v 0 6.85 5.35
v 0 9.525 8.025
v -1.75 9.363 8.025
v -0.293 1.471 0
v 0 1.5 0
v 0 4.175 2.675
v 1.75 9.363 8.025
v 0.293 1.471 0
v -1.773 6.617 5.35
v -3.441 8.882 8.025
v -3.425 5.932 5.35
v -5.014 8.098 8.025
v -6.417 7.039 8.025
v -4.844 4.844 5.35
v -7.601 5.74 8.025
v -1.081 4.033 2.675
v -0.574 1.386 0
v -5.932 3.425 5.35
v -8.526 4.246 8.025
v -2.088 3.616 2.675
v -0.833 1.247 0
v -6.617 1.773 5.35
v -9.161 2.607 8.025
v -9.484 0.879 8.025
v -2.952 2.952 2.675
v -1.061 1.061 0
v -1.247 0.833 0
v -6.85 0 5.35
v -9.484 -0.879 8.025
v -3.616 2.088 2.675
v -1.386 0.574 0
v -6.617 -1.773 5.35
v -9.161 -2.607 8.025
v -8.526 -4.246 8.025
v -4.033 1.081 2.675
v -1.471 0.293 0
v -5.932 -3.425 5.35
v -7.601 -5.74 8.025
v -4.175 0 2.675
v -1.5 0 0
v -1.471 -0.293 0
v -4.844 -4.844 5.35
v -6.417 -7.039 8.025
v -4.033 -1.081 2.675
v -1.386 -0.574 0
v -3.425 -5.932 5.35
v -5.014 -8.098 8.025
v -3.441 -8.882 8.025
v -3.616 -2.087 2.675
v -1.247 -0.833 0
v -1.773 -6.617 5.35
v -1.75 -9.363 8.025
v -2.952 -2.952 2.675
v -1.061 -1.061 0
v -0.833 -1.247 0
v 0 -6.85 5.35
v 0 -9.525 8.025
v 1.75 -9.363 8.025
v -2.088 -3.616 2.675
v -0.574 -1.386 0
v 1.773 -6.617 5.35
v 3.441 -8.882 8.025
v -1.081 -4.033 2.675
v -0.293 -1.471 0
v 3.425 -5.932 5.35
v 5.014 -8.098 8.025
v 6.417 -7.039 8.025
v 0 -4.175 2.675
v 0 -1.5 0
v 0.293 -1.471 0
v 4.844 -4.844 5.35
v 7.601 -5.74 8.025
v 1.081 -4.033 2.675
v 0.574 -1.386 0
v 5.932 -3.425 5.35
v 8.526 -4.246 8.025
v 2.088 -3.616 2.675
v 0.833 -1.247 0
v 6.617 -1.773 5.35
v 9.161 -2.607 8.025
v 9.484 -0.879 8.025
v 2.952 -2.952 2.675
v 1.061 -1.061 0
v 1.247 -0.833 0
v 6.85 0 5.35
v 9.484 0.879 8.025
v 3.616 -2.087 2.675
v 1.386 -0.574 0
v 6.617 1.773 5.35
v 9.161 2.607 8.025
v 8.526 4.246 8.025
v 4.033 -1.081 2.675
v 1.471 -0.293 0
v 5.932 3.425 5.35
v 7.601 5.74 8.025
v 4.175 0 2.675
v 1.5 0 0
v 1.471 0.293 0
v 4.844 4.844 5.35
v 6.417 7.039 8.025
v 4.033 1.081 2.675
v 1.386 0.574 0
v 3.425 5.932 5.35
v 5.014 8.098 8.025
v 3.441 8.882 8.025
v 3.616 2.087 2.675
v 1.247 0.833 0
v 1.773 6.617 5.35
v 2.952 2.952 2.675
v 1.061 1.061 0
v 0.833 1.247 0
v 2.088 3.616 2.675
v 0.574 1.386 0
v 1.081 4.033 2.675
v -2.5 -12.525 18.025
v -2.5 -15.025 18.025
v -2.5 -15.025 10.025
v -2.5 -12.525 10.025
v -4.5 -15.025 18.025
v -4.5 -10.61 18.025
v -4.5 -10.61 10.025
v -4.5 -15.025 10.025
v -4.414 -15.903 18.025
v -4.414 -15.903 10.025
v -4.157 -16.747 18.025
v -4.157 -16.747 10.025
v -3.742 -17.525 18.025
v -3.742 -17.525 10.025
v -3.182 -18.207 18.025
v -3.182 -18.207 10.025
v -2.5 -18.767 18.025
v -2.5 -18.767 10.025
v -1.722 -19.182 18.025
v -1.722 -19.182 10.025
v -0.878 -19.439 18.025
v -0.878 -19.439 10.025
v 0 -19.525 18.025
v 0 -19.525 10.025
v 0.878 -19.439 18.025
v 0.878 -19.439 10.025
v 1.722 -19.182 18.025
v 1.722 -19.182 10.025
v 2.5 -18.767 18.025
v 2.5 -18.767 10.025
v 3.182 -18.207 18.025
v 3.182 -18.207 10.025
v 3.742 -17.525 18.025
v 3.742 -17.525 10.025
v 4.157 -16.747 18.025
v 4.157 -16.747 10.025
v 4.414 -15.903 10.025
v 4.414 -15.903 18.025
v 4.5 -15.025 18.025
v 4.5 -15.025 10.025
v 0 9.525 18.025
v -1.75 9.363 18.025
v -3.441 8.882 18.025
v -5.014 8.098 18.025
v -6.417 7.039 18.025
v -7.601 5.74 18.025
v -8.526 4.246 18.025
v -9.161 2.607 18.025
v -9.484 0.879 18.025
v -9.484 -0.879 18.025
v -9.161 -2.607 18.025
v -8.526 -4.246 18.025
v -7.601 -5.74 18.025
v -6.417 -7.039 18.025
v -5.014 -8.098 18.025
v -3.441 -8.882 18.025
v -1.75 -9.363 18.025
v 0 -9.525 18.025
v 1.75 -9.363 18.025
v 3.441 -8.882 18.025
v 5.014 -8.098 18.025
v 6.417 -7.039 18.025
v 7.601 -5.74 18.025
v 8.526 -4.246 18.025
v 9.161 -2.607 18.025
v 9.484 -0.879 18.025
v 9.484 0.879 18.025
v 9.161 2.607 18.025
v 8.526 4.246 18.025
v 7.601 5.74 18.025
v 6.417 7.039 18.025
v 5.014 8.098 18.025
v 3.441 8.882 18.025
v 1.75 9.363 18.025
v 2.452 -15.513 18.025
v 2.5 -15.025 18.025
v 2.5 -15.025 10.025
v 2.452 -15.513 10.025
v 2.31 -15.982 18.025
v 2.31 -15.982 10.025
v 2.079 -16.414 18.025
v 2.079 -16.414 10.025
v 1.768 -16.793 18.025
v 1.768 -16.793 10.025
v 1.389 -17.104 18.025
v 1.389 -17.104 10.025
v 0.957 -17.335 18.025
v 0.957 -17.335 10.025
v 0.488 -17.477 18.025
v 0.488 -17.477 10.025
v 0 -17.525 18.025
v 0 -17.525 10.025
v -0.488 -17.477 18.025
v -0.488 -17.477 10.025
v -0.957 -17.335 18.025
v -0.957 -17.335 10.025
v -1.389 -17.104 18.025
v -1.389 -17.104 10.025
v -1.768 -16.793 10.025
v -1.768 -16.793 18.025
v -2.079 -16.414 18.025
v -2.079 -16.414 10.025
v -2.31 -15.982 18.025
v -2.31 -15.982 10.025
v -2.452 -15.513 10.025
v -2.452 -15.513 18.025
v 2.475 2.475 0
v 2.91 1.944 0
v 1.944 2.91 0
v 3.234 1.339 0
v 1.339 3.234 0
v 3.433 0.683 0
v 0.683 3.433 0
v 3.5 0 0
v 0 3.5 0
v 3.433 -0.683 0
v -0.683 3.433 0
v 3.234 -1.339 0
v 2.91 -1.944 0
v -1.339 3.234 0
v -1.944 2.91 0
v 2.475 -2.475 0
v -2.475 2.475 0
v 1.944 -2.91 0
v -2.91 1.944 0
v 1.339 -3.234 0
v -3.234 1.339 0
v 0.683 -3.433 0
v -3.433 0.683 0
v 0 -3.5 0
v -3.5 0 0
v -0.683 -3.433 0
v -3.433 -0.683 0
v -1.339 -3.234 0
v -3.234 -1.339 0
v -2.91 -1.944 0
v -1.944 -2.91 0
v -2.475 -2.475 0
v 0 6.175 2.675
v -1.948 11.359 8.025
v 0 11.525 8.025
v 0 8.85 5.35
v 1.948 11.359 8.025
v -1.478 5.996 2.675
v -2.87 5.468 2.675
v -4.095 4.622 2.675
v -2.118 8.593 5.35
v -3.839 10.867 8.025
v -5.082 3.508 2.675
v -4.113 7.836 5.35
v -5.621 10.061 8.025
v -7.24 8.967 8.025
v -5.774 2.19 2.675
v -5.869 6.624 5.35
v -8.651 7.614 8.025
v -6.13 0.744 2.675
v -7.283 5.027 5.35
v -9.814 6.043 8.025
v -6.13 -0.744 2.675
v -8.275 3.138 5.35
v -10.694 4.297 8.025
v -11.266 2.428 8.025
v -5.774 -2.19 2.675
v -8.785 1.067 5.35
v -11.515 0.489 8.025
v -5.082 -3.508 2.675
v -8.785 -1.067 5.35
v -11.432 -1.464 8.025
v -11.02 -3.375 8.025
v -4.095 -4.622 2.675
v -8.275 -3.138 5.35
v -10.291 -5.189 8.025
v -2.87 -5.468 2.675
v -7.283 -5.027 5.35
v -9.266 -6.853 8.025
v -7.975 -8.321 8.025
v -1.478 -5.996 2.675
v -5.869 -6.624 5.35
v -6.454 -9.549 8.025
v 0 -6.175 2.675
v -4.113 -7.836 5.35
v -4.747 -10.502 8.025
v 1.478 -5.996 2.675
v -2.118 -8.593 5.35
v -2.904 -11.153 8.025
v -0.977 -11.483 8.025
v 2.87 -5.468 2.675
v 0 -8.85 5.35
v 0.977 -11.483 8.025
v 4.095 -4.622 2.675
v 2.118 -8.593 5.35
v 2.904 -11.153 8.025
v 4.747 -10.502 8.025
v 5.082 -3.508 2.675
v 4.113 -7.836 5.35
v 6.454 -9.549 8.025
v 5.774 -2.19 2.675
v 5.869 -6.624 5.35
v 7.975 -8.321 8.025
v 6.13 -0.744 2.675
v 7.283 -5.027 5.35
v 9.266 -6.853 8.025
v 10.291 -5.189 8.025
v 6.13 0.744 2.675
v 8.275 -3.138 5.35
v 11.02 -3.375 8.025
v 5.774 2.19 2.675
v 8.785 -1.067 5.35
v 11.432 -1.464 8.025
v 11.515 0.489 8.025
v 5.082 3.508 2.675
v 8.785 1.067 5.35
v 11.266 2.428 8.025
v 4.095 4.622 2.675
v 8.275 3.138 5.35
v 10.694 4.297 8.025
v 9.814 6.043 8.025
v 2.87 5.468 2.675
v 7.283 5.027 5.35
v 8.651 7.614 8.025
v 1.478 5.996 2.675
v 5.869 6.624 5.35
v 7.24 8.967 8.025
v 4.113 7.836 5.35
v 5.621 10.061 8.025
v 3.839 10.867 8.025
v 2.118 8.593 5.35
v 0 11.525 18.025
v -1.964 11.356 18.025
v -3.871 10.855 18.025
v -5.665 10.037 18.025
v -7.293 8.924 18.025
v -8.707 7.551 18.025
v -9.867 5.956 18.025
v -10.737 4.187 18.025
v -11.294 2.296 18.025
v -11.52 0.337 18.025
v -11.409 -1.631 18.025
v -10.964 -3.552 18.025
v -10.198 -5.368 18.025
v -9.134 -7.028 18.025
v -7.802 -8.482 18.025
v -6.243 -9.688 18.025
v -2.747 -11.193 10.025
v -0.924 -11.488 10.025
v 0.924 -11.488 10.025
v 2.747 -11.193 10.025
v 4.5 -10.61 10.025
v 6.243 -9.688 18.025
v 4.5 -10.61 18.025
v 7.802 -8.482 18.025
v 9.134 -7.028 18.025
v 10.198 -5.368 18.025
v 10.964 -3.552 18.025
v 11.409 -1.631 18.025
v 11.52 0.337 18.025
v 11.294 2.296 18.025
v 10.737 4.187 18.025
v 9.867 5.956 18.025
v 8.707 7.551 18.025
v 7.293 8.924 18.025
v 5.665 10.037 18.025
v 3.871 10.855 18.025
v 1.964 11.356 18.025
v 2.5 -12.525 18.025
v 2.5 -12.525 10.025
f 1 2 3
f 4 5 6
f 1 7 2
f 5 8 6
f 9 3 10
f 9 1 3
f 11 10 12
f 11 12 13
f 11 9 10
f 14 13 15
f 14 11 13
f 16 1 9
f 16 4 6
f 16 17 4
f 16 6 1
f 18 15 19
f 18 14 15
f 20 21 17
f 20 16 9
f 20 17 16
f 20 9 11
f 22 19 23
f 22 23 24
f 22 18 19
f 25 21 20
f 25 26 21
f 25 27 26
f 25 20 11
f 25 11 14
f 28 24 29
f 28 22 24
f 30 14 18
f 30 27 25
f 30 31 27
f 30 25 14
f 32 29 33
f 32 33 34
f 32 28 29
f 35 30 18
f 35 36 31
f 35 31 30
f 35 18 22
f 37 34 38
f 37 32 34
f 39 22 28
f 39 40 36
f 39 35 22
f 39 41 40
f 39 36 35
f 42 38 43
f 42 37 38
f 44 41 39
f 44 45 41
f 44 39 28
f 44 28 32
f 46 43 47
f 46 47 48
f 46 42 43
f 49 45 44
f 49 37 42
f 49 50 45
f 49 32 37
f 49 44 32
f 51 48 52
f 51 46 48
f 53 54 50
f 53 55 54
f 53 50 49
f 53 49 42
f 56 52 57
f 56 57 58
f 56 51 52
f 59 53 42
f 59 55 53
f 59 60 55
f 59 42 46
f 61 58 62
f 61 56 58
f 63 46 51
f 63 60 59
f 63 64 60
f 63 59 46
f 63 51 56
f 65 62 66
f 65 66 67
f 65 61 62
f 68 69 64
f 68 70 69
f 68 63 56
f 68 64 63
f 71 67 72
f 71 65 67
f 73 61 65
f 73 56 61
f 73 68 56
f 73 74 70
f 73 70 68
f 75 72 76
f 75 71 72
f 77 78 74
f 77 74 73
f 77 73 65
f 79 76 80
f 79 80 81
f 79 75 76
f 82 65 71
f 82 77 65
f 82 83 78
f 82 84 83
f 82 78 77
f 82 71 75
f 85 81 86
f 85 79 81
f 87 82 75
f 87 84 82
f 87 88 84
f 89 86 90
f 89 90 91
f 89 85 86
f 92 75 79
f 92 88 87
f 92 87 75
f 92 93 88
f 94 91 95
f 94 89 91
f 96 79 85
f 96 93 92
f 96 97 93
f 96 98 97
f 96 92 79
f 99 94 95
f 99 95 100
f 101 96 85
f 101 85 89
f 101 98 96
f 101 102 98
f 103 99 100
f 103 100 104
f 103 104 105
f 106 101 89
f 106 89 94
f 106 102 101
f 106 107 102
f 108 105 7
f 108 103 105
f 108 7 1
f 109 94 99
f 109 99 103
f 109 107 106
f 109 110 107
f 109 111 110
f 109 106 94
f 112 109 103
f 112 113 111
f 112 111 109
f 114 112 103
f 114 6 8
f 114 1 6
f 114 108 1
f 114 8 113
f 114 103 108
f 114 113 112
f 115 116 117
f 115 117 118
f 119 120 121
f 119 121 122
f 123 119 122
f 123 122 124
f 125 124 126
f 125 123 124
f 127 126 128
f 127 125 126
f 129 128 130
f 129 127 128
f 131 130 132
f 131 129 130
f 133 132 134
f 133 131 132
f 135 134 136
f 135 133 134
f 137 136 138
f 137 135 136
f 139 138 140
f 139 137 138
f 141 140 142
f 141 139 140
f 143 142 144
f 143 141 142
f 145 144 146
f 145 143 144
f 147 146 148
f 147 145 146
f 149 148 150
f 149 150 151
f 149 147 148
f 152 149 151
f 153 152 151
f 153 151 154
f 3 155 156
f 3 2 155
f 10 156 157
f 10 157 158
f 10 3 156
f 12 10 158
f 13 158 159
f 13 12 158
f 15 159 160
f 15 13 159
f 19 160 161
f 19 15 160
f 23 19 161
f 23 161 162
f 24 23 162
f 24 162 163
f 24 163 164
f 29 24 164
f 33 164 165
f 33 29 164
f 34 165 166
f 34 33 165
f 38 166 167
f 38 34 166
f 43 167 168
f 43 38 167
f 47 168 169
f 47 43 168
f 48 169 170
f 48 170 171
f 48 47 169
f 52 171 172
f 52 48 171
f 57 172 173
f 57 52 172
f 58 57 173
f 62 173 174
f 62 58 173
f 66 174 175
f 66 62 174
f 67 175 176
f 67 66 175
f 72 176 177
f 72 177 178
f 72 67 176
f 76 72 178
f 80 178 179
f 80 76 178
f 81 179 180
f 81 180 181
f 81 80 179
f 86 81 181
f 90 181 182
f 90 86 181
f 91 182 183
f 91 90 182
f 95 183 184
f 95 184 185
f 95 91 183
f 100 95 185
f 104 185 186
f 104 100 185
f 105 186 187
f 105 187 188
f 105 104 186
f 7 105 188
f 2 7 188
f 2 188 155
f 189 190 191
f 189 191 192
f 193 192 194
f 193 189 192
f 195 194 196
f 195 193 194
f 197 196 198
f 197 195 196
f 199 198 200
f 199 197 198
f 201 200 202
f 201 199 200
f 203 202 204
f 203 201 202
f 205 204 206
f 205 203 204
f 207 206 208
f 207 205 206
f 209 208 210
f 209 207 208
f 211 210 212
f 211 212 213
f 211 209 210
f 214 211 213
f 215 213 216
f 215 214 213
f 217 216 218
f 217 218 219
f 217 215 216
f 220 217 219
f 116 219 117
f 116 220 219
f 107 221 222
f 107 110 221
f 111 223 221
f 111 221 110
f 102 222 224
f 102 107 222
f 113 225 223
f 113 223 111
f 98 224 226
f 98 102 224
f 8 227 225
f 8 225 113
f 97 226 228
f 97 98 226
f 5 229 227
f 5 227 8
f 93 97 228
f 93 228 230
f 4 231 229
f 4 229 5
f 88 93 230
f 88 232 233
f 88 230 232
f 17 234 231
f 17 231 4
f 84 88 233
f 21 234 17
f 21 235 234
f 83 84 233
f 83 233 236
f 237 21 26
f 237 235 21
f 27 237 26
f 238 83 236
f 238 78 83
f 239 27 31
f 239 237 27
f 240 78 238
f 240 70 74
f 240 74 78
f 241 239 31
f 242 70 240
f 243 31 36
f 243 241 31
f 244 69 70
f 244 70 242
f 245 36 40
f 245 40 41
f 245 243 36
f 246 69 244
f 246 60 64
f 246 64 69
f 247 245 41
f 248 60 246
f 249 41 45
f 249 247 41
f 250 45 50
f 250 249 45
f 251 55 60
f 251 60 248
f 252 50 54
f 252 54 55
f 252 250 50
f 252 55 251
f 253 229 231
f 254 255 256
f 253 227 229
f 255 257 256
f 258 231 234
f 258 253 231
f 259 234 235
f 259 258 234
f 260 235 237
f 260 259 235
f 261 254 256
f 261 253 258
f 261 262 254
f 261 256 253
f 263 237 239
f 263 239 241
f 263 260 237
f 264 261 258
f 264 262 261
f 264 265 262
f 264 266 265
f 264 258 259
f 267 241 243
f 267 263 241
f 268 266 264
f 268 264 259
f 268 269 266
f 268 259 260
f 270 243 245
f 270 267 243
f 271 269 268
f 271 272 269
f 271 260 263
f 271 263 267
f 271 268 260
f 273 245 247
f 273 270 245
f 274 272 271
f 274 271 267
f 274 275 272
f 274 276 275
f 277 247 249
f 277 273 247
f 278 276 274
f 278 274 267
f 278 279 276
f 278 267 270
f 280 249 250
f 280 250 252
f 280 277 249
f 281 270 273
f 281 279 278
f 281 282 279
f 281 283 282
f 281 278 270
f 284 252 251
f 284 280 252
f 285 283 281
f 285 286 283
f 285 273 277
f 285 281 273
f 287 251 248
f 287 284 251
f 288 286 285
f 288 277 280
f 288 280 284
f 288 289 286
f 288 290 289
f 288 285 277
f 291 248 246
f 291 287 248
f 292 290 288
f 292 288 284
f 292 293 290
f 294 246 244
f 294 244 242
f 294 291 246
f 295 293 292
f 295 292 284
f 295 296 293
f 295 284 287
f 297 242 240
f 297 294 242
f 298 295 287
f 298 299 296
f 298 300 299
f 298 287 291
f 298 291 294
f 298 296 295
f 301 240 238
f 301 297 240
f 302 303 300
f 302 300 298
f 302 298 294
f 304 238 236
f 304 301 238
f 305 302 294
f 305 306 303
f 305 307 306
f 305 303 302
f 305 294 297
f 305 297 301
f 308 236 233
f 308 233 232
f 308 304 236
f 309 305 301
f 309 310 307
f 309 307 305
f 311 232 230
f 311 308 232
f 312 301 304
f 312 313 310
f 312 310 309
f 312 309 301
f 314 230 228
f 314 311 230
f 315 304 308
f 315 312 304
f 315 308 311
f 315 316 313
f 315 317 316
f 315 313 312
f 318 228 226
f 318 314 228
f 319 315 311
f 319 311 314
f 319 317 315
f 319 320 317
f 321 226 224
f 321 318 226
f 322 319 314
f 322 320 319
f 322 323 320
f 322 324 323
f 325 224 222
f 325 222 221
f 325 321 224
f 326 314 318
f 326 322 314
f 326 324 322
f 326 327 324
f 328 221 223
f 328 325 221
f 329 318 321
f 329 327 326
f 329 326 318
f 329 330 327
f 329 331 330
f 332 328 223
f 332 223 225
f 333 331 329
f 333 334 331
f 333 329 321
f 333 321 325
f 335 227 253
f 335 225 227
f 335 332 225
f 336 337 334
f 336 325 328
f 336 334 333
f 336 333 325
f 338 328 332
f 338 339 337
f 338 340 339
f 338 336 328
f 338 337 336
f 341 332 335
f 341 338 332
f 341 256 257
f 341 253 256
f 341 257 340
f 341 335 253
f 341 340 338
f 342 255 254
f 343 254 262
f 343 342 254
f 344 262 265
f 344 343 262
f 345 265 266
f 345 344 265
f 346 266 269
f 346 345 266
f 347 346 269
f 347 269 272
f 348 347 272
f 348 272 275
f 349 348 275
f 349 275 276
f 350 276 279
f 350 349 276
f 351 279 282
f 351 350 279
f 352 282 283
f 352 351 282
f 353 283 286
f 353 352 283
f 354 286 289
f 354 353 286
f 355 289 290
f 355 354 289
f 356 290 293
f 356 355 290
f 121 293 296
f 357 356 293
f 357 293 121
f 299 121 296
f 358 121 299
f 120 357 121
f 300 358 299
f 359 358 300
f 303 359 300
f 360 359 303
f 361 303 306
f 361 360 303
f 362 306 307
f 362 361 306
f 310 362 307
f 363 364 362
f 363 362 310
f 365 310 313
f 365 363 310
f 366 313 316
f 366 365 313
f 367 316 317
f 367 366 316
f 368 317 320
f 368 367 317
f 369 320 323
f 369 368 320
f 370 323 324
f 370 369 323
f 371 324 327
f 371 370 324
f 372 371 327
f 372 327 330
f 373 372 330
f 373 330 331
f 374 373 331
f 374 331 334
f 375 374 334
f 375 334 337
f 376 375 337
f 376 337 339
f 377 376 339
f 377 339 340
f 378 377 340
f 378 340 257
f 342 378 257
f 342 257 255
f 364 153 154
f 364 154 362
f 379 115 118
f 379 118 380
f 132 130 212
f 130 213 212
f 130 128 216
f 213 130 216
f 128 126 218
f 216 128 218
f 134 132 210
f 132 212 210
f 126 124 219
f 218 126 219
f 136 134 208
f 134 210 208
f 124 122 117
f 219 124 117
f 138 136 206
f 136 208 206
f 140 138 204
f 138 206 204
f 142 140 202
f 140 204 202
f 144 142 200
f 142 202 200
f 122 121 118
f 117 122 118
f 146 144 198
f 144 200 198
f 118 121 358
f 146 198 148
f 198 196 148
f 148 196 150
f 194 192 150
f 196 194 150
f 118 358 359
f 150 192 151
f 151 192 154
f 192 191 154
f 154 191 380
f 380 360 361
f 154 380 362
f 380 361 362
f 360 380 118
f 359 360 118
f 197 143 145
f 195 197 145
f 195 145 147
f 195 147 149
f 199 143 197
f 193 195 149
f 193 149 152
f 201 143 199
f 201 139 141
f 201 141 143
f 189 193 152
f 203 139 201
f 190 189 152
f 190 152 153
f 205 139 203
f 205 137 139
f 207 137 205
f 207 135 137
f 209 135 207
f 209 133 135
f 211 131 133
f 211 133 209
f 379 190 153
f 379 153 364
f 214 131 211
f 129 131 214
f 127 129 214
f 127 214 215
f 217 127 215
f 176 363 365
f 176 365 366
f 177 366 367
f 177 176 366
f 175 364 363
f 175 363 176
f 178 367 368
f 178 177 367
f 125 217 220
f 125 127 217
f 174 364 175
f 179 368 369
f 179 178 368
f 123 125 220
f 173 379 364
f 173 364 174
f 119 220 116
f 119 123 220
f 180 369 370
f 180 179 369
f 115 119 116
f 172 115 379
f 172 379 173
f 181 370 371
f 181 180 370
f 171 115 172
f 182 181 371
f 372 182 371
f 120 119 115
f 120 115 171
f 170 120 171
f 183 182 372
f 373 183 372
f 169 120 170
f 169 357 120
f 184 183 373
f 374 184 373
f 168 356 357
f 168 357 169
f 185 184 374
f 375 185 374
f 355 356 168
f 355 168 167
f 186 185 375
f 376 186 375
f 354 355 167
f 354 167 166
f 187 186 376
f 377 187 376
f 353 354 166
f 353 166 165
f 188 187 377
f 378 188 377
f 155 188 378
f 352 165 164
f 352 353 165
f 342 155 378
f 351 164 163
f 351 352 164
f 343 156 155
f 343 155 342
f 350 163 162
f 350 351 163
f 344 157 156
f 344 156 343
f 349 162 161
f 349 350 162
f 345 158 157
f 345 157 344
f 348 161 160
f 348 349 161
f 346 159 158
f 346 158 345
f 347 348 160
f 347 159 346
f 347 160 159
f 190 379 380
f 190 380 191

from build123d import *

# Parameters (mm, degrees)
F3_DEPTH = 8


with BuildPart() as f1:
    # F0 (on Right) → F1 (revolve)
    with BuildSketch(Plane.YZ):
        Polygon((9.525, 18.025), (9.525, 8.025), (1.5, 0), (3.5, 0), (11.525, 8.025), (11.525, 18.025), align=None)
    revolve(axis=Axis((0, 0, 10.187358), (0, 0, 1)))

    # F2 (on face) → F3 (join)
    with BuildSketch(Plane.XY.offset(18.025)):
        with BuildLine():
            ThreePointArc((4.5, -10.610166), (0, -11.525), (-4.5, -10.610166))
            Line((-4.5, -10.610166), (-4.5, -15.025))
            ThreePointArc((-4.5, -15.025), (0, -19.525), (4.5, -15.025))
            Line((4.5, -15.025), (4.5, -10.610166))
        make_face()
        with BuildLine():
            Line((-2.5, -15.025), (-2.5, -12.525))
            Line((-2.5, -12.525), (2.5, -12.525))
            Line((2.5, -12.525), (2.5, -15.025))
            ThreePointArc((2.5, -15.025), (0, -17.525), (-2.5, -15.025))
        make_face(mode=Mode.SUBTRACT)
    extrude(amount=-F3_DEPTH)


solid = f1.part
